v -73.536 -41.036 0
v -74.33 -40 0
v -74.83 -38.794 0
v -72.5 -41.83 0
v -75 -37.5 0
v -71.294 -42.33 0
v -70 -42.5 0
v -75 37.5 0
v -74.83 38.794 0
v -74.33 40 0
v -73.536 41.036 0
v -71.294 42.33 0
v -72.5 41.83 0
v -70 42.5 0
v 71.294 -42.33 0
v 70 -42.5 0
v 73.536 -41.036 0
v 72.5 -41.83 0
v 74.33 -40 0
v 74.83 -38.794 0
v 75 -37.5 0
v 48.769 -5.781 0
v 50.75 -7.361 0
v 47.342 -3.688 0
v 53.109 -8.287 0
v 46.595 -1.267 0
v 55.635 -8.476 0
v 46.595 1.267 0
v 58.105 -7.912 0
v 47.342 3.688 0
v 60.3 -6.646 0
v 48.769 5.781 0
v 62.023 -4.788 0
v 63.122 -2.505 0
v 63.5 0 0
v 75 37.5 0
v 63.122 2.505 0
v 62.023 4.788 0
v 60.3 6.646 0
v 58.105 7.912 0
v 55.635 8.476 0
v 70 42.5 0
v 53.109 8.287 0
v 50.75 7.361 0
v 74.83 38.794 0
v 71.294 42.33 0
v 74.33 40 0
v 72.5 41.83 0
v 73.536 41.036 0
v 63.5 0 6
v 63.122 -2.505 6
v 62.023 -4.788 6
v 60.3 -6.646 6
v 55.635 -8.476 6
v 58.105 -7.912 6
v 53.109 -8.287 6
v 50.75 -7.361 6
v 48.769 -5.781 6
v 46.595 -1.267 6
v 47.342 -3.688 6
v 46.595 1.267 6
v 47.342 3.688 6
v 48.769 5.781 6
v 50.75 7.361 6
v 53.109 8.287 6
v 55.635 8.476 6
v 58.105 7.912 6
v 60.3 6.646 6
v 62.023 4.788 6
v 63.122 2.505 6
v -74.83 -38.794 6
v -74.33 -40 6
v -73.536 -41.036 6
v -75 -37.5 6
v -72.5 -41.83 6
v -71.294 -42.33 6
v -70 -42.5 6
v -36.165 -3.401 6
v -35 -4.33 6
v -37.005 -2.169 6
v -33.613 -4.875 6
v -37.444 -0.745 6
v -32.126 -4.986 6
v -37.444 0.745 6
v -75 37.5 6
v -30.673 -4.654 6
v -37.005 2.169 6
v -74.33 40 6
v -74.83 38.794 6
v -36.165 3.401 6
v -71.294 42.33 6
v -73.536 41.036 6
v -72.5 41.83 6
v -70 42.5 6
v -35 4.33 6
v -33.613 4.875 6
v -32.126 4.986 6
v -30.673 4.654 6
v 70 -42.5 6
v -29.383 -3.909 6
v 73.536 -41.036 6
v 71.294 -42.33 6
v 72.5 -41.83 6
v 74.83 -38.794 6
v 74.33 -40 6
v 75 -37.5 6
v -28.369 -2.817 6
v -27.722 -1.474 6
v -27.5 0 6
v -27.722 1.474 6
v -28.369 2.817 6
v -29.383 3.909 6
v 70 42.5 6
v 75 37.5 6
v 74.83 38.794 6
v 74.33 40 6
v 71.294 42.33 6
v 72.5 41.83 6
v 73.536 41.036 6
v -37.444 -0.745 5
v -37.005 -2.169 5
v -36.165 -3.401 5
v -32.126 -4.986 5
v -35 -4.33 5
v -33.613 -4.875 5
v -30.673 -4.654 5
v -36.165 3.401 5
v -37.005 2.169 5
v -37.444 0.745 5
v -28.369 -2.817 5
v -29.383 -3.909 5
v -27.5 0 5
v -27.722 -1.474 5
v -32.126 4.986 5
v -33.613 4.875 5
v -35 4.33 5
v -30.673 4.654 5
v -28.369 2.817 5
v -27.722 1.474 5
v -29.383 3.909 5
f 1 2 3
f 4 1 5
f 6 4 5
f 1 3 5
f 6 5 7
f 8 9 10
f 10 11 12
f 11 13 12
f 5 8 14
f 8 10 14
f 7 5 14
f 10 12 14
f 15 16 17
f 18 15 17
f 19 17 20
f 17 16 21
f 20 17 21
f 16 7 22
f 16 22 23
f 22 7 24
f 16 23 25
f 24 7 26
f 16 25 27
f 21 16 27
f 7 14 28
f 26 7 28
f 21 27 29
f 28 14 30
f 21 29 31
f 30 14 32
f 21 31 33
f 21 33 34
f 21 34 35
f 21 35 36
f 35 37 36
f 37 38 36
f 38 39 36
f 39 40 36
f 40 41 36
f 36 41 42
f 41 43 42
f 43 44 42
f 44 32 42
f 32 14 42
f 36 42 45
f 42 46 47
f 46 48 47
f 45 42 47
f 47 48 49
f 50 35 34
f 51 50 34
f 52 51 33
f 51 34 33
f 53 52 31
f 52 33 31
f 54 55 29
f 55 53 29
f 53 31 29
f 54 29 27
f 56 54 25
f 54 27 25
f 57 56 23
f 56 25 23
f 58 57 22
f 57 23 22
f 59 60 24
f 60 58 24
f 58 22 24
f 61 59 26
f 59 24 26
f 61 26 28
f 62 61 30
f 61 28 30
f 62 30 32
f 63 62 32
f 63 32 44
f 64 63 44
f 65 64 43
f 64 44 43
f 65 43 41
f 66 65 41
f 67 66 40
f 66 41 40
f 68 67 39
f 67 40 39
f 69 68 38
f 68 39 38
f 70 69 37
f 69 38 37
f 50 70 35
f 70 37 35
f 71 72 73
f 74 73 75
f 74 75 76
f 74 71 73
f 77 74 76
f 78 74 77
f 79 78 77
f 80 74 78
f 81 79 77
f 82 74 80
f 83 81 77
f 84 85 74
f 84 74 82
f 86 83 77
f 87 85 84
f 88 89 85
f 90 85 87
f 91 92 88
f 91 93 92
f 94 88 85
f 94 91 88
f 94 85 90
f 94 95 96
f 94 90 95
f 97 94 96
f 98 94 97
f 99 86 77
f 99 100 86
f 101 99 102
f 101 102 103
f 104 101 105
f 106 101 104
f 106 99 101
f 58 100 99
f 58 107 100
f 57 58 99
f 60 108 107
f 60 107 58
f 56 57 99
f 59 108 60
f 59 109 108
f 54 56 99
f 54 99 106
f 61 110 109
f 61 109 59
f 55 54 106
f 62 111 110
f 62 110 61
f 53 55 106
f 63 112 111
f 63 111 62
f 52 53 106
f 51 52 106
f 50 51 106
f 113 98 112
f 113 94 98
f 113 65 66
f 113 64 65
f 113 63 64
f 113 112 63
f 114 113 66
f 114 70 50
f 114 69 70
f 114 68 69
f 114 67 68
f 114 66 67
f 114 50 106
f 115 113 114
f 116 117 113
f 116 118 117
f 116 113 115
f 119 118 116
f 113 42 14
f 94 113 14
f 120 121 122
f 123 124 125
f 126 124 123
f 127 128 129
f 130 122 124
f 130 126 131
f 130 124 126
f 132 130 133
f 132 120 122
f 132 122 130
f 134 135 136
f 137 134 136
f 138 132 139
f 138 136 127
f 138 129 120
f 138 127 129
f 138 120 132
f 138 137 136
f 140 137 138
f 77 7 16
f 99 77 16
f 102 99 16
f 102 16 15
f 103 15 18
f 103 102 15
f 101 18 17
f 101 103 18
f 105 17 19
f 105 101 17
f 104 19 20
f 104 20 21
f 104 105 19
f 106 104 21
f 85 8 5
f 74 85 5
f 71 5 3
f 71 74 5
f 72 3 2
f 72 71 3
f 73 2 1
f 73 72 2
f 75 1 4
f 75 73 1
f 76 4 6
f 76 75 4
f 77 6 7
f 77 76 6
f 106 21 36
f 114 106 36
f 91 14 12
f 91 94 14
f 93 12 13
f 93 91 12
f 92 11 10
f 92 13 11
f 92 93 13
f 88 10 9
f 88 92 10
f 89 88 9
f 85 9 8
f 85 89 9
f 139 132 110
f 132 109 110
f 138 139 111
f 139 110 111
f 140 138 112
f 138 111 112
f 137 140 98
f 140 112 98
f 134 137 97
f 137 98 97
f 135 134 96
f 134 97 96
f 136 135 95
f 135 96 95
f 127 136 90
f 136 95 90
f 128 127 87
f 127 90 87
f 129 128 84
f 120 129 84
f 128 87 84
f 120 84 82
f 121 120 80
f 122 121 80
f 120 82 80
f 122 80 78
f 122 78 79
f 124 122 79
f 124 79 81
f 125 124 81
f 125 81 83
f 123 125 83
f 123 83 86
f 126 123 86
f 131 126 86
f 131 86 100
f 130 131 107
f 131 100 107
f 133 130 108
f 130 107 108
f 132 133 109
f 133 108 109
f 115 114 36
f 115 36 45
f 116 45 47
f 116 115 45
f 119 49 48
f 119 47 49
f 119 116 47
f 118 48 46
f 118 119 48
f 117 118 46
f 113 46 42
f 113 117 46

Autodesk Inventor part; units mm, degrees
ref_plane "YZ Plane" through (0, 0, 0) normal (1, 0, 0) x (0, 1, 0)
ref_plane "XZ Plane" through (0, 0, 0) normal (0, 1, 0) x (-1, 0, 0)
ref_plane "XY Plane" through (0, 0, 0) normal (0, 0, 1) x (1, 0, 0)
sketch "Sketch1" plane through (0, 0, 0) normal (0, 0, 1) x (1, 0, 0)
  line L0 (-75, -42.5) -> (75, -42.5)
  line L1 (75, -42.5) -> (75, 42.5)
  line L2 (75, 42.5) -> (-75, 42.5)
  line L3 (-75, 42.5) -> (-75, -42.5)
  line L4 (-75, -42.5) -> (75, 42.5) construction
  line L5 (75, -42.5) -> (-75, 42.5) construction
  circle A0 centre (55, -22.5) radius 8.5
  circle A1 centre (55, 22.5) radius 8.5
  line L6 (0, 0) -> (75, 0) construction
  circle A2 centre (55, 0) radius 8.5
  dimension "d0" = 150
  dimension "d1" = 85
  dimension "d23" = 17
  dimension "d25" = 20
  dimension "d26" = 20
extrude "Plate1" add sketch "Sketch1" along normal blind 6 contours L3 L2 L1 L0 | A0 | A1
sketch "Sketch5" plane through (0, 0, 6) normal (0, 0, 1) x (1, 0, 0)
  line L0 (75, -42.5) -> (-75, -42.5) projected
  line L1 (-75, -42.5) -> (-75, 42.5) projected
  line L2 (-75, 42.5) -> (75, 42.5) projected
  circle A0 centre (-32.5, 0) radius 42.5
  circle A1 centre (-32.5, 0) radius 5
  point P0 (0, 0)
  point P1 (50, -55)
  point P2 (-50, -55)
  point P3 (-70, -35)
  point P4 (-70, 35)
  point P5 (-50, 55)
  point P6 (50, 55)
  dimension "d27" = 10
extrude "Extrusion2" cut sketch "Sketch5" against normal blind 1 contours A1
fillet "Corner Round2" radius 5 4 edges at (-75, 42.5, 3) (-75, -42.5, 3) (75, -42.5, 3) (75, 42.5, 3)
equation "\"d26\" = d25"
equation "\"d2\" = Thickness"
equation "\"BendReliefWidth\" = Thickness"
equation "\"BendReliefDepth\" = 0.5 * Thickness"
equation "\"CornerReliefSize\" = 4 * Thickness"
equation "\"MinimumRemnant\" = 2 * Thickness"
equation "\"TransitionRadius\" = BendRadius"
equation "\"JacobiRadiusSize\" = BendRadius"
equation "\"GapSize\" = Thickness"
equation "\"Thickness\" = 6"
equation "\"BendRadius\" = 5"
properties part number "PNS 1695 leg floor plate" material "Stainless Steel"
